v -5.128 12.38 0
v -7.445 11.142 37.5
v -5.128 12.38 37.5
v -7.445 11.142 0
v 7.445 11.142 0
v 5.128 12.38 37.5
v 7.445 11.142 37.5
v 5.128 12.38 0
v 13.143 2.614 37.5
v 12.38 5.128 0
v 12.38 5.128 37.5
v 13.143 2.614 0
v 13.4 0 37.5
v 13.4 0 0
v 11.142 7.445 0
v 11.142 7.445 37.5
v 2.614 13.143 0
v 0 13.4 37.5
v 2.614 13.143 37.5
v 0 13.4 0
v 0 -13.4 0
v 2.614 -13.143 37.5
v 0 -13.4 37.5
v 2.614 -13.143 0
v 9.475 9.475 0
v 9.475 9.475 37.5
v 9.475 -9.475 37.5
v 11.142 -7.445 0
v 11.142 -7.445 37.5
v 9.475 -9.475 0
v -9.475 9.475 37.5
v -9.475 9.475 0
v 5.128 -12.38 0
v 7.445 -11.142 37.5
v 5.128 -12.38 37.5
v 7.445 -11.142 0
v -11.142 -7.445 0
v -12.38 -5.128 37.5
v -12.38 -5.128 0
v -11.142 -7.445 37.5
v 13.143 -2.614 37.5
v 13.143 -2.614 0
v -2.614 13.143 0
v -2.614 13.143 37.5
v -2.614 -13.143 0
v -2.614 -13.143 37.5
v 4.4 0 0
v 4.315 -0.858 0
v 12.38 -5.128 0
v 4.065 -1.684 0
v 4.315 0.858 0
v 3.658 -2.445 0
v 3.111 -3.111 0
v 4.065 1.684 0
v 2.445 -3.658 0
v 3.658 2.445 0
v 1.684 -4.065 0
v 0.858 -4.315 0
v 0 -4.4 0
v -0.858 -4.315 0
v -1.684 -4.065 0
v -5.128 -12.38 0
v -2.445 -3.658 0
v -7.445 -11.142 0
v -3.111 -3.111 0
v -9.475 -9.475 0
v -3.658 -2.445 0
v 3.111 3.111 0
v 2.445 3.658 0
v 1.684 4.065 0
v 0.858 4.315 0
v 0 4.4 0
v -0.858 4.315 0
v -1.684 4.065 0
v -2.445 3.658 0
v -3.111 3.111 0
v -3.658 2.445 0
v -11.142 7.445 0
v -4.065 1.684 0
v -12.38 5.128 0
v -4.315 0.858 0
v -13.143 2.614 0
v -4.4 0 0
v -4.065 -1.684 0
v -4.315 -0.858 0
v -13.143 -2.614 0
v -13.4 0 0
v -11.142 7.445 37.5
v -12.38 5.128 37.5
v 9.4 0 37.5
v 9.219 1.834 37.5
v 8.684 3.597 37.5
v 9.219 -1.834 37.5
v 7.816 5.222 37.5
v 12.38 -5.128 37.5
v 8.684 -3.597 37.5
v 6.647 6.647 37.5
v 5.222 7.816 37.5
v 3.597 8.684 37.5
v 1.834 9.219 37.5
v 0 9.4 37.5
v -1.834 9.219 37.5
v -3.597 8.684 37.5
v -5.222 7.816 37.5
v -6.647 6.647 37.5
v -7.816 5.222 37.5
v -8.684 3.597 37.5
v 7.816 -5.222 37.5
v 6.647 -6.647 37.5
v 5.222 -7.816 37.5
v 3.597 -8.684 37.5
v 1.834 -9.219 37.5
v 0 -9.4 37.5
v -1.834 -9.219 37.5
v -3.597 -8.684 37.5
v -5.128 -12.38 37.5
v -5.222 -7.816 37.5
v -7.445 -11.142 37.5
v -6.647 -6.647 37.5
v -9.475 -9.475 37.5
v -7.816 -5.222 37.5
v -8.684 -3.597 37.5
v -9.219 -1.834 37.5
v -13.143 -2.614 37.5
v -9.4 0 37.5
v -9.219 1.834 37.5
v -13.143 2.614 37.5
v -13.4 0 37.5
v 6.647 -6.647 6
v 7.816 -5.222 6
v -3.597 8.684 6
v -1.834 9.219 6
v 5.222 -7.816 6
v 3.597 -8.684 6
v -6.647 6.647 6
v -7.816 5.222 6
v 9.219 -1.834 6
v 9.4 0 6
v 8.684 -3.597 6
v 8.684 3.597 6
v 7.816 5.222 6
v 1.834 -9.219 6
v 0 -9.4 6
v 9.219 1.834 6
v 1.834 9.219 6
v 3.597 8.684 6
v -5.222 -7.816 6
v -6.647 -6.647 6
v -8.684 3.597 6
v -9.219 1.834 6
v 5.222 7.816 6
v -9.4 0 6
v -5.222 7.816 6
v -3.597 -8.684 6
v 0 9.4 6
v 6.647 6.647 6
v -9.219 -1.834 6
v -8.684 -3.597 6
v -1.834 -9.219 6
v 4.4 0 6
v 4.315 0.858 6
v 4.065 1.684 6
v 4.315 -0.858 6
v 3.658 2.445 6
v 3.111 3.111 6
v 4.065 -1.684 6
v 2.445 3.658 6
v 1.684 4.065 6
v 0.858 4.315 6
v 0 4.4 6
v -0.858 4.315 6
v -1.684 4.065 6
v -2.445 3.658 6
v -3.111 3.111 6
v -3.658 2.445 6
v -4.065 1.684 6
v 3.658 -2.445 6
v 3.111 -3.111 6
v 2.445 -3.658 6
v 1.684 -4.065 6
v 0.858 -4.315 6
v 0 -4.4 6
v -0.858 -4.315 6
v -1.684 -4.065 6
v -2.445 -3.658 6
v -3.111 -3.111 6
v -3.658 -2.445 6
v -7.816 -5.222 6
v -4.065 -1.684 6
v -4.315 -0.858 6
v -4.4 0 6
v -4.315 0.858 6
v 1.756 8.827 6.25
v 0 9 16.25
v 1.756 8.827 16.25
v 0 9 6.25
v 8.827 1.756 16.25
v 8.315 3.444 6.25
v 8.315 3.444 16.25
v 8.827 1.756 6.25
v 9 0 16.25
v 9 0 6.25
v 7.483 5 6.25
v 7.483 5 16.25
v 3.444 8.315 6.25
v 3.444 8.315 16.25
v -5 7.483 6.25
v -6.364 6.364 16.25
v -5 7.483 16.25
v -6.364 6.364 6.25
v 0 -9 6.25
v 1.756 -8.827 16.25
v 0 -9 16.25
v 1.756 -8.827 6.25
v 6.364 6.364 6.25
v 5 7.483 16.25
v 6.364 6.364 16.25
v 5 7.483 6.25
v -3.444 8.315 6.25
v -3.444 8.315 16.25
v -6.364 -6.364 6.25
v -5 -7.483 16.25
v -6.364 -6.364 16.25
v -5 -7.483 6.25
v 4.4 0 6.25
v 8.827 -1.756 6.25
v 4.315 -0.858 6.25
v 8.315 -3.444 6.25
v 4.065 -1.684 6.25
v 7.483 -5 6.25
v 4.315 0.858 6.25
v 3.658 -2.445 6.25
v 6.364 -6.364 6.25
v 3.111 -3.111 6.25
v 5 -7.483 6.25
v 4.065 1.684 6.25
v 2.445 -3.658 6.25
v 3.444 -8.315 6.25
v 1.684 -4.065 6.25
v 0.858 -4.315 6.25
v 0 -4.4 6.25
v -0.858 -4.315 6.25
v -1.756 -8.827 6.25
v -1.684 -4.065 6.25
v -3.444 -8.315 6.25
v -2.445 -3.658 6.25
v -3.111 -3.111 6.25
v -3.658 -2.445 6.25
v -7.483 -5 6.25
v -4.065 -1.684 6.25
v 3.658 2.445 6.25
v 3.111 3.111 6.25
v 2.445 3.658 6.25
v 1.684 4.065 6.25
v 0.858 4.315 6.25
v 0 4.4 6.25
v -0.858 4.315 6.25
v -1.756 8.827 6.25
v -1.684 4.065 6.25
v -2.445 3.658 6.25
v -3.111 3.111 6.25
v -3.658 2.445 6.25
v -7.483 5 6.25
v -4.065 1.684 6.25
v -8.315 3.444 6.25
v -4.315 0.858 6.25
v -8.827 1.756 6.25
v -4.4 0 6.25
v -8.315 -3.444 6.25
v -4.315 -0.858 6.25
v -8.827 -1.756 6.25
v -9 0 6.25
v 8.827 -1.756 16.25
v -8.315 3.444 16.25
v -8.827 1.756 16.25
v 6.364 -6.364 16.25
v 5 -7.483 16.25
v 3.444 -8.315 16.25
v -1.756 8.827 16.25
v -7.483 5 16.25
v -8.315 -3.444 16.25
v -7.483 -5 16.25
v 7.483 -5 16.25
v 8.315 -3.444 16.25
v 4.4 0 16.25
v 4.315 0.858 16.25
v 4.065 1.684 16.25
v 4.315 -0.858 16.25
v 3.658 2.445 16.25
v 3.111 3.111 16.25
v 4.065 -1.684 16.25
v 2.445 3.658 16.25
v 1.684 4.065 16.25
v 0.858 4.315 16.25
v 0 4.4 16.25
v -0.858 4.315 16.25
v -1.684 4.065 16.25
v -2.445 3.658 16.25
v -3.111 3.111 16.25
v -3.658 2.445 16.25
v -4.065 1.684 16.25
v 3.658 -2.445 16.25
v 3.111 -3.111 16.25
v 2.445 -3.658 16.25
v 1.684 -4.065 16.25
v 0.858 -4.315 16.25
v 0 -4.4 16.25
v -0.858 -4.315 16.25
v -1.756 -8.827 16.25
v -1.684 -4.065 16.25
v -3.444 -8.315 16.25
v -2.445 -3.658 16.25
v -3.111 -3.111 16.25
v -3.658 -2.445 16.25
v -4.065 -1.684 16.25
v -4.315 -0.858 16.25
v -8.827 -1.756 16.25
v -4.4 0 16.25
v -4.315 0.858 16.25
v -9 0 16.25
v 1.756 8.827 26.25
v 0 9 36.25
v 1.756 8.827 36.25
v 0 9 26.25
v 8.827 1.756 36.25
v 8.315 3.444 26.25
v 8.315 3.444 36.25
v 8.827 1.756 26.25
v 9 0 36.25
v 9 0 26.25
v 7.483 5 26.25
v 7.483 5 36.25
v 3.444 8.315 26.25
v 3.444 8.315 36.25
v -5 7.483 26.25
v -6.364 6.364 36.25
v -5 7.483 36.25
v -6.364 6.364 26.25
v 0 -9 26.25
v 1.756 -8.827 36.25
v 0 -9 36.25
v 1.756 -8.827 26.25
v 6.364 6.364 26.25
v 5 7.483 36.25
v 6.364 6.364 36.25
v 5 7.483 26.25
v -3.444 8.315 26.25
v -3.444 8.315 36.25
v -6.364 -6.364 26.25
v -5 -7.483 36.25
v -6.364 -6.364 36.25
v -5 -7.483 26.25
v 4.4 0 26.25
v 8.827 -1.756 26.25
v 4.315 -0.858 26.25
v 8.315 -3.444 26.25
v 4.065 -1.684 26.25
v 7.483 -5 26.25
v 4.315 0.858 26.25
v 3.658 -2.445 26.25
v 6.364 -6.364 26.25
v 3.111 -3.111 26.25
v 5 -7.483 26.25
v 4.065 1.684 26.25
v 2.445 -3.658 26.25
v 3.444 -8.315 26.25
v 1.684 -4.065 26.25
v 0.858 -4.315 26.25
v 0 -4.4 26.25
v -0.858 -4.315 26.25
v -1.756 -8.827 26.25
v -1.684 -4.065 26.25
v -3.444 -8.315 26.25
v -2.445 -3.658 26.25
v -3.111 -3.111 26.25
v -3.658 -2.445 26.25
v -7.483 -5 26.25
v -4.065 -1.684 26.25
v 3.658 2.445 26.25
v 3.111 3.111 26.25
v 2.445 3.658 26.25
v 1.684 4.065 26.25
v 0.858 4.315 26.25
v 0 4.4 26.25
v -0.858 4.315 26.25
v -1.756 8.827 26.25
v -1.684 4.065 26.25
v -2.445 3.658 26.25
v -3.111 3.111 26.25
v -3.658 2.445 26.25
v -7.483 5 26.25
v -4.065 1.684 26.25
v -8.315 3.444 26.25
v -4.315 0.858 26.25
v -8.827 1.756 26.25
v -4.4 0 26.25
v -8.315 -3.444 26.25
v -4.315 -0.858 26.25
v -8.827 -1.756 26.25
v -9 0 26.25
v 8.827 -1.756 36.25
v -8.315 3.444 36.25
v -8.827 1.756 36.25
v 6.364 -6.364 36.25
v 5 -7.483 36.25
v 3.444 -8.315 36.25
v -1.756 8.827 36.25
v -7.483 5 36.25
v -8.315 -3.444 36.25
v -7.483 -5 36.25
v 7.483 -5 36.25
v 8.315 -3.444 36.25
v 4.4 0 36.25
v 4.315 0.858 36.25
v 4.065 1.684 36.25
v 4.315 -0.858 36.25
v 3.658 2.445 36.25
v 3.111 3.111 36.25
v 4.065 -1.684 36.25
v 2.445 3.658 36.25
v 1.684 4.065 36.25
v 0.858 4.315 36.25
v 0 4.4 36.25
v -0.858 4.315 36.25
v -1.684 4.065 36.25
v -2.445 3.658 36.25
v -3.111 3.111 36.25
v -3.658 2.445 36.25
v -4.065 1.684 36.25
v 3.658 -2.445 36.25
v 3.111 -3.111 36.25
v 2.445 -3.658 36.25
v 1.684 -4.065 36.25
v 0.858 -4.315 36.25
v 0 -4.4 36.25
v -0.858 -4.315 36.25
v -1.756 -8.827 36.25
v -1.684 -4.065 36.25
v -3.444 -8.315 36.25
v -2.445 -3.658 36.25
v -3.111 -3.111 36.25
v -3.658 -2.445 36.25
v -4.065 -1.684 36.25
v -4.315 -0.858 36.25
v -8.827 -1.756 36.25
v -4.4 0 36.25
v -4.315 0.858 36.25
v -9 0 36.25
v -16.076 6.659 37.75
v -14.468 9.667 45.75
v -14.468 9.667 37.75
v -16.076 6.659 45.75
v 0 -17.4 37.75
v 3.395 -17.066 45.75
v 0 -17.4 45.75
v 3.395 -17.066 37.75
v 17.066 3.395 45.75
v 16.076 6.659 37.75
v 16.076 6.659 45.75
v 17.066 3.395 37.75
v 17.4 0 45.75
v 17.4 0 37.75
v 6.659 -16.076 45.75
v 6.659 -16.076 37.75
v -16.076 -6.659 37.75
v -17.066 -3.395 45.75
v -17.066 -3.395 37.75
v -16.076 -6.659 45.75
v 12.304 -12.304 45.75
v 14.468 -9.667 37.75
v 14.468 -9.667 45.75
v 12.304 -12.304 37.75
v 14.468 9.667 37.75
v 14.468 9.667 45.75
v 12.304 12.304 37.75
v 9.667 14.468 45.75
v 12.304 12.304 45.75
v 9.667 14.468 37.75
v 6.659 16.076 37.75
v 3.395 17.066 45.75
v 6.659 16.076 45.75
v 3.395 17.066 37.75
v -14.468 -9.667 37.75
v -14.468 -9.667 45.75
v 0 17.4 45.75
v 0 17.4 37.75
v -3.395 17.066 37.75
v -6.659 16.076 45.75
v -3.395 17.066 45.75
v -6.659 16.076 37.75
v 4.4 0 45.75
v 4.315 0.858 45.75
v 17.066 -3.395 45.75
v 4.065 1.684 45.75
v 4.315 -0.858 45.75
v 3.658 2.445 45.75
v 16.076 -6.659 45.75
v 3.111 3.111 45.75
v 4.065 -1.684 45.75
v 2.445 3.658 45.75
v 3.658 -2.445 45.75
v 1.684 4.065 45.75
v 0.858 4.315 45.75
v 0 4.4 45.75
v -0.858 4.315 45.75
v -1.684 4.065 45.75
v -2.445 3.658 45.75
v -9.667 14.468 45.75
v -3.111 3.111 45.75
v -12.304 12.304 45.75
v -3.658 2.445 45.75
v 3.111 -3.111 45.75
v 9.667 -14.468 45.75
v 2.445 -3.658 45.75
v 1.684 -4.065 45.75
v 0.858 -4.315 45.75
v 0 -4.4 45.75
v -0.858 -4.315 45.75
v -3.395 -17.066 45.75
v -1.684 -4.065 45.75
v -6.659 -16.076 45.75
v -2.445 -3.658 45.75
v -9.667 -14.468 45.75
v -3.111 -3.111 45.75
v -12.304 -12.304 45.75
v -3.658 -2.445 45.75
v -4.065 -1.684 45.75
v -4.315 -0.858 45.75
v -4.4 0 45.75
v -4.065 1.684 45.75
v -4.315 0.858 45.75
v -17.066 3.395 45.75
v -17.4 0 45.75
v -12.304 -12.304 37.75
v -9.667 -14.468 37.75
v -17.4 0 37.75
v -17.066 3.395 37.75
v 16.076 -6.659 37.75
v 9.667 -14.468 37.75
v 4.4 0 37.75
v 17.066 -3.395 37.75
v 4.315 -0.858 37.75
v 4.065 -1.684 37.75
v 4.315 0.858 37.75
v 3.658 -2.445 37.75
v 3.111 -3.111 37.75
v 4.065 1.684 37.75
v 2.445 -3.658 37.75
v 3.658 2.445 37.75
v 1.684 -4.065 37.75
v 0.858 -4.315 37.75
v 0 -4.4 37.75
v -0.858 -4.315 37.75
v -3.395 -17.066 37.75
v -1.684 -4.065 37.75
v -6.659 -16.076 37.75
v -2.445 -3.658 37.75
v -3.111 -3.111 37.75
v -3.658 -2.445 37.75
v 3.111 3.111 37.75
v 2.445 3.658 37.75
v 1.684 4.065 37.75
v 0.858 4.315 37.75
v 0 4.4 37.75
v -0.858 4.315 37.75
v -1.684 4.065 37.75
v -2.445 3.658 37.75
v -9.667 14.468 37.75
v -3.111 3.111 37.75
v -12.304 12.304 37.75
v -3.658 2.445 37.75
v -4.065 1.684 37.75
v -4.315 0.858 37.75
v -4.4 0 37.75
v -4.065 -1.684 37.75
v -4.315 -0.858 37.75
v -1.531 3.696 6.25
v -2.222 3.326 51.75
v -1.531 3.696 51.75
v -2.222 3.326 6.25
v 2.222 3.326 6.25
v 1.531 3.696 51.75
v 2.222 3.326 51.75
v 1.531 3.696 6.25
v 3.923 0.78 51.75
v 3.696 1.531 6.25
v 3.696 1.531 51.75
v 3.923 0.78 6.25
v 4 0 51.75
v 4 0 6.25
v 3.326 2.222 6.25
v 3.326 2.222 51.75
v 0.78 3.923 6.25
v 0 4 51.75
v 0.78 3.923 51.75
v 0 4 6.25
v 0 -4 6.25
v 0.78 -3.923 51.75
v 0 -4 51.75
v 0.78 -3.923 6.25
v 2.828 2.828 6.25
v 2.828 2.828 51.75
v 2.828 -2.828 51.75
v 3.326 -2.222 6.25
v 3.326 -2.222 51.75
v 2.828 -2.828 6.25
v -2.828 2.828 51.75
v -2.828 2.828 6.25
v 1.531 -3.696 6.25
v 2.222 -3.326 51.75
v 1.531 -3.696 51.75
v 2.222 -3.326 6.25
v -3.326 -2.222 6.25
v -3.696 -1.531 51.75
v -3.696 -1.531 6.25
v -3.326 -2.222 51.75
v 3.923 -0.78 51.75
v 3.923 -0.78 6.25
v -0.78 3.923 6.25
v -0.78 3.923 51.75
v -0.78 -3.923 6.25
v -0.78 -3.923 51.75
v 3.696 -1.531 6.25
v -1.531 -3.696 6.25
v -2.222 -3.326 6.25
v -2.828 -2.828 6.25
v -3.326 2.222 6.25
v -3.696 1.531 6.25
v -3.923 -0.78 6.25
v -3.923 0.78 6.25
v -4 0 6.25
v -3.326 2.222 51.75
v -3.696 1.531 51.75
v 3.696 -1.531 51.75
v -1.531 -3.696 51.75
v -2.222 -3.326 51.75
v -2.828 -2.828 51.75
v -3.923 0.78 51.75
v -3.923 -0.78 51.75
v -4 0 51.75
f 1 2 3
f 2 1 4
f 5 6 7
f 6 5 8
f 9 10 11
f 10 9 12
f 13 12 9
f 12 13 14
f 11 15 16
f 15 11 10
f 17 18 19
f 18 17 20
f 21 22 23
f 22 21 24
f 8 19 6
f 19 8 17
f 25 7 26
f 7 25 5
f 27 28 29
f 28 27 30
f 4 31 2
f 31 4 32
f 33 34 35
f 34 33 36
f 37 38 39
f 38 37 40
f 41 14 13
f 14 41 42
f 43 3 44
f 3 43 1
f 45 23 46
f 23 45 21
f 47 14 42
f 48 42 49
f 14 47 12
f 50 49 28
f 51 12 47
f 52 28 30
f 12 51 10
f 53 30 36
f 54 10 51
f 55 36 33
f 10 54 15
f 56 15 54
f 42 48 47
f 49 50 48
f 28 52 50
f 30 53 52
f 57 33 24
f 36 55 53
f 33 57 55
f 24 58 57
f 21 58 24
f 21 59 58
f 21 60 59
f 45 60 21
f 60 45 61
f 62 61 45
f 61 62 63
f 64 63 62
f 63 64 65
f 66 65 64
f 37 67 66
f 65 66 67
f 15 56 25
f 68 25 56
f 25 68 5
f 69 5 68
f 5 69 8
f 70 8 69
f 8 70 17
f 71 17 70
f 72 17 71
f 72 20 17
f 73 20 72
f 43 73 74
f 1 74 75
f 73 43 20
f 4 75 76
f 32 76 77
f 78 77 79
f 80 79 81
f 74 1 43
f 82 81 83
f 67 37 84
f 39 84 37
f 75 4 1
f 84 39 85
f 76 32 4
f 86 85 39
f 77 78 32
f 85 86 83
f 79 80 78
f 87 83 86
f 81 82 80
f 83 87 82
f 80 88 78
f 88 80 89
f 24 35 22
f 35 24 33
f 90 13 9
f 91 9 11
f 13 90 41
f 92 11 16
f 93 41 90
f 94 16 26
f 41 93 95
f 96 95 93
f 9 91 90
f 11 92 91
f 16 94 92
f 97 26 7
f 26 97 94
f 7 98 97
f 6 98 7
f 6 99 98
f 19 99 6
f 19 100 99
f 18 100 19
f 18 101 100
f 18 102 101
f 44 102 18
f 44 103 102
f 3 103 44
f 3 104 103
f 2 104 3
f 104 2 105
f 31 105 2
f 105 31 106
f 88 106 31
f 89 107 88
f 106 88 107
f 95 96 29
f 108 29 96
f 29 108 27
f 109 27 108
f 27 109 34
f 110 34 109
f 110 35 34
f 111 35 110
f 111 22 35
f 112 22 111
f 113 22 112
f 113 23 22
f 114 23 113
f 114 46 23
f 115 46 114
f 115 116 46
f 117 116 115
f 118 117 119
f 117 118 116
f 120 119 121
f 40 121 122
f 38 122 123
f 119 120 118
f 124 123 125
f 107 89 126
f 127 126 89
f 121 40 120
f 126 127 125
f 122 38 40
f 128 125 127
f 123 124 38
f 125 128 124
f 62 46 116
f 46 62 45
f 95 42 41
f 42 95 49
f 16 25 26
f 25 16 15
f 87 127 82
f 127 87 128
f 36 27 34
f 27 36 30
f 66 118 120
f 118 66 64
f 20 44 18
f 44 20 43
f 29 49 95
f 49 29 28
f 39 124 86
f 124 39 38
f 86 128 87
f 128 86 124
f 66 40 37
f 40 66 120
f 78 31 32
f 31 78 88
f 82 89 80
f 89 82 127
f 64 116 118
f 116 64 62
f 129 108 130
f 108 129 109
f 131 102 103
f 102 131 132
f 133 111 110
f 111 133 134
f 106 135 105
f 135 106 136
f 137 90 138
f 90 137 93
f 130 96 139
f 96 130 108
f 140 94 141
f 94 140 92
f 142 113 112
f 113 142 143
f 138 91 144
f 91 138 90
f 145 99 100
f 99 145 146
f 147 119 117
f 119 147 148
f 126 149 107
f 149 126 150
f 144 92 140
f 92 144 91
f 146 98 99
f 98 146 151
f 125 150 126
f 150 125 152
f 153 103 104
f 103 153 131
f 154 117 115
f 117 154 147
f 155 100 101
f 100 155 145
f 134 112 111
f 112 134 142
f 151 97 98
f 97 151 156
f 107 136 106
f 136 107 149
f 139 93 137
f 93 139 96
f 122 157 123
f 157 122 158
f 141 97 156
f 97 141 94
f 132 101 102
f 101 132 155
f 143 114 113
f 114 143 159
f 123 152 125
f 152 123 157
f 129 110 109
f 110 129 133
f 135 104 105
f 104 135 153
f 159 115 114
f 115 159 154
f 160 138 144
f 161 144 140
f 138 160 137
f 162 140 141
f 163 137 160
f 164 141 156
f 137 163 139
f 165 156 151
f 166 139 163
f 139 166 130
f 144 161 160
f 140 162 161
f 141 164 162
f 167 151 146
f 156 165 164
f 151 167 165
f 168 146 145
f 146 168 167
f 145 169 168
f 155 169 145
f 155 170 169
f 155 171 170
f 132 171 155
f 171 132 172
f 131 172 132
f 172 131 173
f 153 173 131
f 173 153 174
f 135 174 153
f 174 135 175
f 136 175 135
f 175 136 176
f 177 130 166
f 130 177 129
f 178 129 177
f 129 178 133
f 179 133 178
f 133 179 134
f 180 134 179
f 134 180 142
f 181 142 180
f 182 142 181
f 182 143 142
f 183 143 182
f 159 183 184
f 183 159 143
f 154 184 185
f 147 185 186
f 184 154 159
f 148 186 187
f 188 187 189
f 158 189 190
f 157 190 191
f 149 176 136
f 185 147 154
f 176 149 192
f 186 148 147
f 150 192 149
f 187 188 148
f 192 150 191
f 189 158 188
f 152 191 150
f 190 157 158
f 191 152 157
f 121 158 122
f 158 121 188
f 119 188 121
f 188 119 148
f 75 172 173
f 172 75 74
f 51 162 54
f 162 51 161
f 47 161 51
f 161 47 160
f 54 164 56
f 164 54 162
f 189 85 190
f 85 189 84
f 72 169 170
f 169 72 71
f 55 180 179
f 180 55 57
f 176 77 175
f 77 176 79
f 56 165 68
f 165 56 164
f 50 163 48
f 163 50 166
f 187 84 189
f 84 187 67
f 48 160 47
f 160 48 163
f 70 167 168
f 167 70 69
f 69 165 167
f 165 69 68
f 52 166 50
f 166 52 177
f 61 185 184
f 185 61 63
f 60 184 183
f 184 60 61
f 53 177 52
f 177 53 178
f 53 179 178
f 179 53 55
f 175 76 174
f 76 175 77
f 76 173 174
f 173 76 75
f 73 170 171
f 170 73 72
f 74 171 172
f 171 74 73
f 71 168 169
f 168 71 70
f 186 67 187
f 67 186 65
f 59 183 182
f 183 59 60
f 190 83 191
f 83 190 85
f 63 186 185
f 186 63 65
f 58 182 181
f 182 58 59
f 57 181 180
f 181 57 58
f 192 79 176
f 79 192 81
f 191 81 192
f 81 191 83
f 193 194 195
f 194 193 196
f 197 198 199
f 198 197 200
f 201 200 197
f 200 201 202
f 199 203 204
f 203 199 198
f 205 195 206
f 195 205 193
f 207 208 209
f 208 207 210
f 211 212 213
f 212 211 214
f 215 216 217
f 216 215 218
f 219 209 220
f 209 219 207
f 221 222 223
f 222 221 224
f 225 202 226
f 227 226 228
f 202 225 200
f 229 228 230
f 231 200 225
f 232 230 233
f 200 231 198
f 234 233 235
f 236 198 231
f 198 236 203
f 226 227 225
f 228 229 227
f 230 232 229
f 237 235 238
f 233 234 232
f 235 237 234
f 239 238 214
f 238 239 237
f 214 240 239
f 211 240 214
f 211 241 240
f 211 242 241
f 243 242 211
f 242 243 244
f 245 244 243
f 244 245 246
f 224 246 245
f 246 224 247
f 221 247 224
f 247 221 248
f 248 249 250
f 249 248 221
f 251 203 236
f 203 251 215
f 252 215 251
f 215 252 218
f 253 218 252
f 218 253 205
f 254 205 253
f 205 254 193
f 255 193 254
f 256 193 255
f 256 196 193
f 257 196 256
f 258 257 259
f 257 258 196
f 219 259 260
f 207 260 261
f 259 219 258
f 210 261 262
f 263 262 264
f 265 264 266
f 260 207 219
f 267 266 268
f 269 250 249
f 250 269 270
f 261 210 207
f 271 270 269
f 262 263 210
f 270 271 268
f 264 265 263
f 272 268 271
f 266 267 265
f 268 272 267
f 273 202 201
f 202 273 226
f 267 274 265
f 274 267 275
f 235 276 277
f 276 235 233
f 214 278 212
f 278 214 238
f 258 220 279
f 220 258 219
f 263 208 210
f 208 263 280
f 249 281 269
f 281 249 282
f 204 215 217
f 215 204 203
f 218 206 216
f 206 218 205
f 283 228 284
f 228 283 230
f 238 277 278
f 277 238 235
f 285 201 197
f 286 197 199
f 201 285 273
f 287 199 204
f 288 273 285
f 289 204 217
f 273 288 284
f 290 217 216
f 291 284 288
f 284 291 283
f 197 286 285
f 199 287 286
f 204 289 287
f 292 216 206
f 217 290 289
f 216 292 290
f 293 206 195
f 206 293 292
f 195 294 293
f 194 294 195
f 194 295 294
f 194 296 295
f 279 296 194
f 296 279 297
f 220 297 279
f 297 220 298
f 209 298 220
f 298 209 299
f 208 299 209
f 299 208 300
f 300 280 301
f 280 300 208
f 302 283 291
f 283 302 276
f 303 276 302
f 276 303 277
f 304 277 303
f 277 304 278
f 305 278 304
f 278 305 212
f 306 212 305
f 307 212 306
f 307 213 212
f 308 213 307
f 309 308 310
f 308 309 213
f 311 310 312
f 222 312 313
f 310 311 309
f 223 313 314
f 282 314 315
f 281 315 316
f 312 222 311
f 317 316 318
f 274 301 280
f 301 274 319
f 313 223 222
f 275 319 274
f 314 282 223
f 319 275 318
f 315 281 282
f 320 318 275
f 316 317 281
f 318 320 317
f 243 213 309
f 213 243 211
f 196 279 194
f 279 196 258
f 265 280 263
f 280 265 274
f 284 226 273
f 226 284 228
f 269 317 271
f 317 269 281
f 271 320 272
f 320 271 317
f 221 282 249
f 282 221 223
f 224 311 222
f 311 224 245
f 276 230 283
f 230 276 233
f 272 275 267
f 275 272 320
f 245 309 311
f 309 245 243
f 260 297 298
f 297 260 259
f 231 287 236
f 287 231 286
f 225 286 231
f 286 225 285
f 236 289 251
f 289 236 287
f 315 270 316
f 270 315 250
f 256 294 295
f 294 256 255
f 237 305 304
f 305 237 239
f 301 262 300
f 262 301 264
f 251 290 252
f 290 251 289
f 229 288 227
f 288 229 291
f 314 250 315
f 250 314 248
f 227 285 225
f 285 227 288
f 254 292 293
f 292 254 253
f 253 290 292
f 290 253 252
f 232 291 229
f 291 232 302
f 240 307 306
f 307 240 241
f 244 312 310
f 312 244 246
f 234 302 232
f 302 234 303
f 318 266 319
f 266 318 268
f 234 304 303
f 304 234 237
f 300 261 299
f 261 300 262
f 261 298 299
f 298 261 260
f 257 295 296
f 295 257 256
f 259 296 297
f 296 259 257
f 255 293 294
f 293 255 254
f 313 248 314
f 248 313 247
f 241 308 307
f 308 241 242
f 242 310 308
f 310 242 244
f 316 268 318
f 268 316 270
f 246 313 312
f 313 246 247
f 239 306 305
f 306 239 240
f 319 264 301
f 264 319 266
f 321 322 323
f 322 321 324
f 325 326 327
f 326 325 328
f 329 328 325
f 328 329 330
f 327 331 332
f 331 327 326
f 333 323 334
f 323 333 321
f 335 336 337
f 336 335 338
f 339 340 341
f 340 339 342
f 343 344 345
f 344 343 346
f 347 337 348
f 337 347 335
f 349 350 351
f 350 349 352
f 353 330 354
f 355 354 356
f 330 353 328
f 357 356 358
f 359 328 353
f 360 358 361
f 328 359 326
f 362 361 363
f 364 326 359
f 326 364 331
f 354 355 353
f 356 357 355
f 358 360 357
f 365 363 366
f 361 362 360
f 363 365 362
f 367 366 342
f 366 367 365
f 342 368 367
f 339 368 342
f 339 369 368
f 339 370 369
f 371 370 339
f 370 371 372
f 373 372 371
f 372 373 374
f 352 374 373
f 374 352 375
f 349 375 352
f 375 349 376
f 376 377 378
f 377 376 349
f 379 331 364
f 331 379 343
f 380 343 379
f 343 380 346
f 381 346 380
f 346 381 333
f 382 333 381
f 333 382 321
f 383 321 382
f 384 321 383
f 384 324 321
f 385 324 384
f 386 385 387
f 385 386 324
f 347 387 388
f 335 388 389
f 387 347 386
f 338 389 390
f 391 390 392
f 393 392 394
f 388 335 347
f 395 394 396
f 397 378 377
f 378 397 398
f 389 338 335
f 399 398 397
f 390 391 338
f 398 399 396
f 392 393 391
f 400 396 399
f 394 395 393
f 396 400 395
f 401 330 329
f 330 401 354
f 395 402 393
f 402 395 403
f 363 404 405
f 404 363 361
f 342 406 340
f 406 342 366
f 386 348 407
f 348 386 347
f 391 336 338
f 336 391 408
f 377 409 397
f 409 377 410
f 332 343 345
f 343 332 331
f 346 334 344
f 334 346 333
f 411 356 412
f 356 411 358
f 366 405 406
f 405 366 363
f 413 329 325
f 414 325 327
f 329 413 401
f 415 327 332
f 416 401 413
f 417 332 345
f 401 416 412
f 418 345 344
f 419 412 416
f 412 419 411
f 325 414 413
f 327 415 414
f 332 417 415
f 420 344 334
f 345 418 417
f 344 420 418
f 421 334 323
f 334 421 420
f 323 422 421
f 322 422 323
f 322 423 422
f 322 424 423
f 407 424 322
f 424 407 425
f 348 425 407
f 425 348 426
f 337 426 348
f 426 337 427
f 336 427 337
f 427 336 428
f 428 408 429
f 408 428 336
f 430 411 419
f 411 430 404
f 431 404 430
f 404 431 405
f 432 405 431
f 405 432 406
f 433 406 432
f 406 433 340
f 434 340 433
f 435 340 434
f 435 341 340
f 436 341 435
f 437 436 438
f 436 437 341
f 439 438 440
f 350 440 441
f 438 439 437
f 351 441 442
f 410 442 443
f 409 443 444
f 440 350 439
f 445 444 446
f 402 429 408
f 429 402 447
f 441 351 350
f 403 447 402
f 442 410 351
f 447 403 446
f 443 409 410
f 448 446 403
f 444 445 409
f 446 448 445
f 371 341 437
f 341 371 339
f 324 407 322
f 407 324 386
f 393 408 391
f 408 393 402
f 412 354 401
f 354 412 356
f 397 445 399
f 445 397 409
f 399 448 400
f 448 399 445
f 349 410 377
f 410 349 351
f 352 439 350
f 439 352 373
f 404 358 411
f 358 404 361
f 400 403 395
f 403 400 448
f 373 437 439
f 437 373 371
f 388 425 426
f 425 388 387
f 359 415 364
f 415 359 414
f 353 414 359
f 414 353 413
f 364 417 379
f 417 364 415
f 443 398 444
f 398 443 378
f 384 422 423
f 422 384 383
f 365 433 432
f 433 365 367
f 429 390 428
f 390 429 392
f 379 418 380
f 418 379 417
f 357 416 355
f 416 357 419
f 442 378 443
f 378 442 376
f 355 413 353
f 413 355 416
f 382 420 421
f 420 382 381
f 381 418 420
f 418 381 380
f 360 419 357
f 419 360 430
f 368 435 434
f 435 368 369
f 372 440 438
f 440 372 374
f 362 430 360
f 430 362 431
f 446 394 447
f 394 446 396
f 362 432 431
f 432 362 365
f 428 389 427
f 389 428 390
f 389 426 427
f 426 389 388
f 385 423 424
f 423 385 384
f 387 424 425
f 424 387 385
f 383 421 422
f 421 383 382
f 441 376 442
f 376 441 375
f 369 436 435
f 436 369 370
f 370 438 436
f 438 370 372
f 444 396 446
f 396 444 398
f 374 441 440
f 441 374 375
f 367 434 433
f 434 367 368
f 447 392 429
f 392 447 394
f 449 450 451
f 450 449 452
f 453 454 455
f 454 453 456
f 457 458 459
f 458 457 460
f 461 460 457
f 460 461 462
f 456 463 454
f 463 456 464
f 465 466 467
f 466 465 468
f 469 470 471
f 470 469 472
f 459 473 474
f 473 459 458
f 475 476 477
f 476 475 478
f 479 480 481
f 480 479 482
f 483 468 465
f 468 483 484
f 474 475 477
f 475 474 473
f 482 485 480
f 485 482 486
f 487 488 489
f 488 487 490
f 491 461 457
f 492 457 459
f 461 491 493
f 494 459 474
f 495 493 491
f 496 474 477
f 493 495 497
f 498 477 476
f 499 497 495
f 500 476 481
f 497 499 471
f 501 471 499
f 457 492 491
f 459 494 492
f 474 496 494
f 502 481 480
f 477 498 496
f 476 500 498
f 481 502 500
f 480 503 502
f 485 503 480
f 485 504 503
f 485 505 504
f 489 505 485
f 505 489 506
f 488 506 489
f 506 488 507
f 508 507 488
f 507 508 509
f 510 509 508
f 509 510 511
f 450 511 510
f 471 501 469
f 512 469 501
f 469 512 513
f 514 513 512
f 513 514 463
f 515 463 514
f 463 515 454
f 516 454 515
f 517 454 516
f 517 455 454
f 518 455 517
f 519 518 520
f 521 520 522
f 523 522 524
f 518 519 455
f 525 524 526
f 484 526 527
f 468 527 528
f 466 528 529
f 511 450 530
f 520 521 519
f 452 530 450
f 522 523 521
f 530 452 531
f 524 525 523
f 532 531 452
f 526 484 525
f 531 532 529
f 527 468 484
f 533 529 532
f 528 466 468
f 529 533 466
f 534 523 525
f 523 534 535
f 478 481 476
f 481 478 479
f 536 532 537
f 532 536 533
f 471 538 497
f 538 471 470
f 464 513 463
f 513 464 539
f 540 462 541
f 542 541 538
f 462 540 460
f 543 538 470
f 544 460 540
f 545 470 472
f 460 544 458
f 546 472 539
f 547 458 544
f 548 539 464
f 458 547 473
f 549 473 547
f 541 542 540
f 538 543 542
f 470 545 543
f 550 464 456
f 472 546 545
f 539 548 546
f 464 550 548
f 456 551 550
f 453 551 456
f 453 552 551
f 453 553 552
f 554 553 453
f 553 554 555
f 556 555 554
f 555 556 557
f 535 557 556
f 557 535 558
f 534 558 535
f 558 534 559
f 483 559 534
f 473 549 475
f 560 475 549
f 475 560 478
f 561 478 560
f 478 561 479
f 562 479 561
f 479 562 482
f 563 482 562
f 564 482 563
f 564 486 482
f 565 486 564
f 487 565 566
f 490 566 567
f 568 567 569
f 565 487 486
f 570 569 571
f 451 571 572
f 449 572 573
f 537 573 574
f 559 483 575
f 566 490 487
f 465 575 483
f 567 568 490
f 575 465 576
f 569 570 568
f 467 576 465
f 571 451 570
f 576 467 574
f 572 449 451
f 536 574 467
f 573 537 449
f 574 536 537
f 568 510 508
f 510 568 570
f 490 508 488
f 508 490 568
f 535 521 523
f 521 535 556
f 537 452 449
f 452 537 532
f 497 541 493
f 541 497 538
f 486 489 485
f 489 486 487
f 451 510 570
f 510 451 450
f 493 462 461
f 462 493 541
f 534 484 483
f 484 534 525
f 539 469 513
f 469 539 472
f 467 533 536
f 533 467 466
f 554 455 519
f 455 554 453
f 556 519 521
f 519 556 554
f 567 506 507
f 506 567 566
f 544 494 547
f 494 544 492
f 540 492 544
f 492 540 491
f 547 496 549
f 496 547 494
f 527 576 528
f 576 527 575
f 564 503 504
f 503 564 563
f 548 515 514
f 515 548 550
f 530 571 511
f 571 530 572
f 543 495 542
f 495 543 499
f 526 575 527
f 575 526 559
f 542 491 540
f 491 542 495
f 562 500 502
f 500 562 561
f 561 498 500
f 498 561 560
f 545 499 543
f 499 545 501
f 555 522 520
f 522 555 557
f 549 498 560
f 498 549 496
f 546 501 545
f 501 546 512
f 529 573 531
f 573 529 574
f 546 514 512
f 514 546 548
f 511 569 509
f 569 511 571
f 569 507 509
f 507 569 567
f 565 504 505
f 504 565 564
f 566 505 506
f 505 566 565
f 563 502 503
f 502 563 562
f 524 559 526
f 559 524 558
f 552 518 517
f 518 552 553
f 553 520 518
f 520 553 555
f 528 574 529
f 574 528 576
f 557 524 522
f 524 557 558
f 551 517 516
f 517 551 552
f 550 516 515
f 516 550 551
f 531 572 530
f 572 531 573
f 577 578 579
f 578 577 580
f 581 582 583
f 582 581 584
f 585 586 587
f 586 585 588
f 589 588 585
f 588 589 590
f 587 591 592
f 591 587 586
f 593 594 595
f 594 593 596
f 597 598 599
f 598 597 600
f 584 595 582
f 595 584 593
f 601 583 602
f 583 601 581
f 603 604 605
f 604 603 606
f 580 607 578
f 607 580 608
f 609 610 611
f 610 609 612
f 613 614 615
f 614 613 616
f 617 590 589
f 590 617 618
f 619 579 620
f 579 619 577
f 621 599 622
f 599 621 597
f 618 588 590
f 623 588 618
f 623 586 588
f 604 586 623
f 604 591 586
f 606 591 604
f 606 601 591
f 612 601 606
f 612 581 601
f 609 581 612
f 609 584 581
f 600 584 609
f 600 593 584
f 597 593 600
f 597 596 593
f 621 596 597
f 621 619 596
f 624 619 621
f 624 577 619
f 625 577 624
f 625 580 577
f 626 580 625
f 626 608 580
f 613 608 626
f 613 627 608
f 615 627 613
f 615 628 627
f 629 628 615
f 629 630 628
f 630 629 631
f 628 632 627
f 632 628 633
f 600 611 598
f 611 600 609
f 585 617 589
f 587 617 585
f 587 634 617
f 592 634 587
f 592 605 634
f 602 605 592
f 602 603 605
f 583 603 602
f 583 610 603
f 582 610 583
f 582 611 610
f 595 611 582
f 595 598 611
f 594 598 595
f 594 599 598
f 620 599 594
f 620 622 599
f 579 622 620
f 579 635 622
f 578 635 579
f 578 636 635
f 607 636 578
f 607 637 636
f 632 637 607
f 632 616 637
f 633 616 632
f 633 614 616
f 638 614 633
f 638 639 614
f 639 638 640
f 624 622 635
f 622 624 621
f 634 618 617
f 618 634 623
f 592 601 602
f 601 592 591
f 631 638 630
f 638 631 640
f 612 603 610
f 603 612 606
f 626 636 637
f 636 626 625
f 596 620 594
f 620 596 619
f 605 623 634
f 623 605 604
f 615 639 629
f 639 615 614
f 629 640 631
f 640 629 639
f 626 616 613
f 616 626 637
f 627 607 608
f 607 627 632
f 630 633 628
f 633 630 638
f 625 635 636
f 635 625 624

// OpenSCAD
$fn = 32;

// ------------------------------------------------------------------------
// Shaft station: cup d26.8 x 37.5 mm, shaft d8
// Every part is its own module, assembly() places every instance.
// ------------------------------------------------------------------------

// --- part 1 ---
module housing_cup() {
  difference() {
    cylinder(h = 37.5, d = 26.8);
    translate([0, 0, 6]) cylinder(h = 32.5, d = 18.8);
    translate([0, 0, -1]) cylinder(h = 8, d = 8.8);
  }
}

// --- part 2 ---
module bearing_lower() {
  difference() {
      translate([0, 0, 0]) cylinder(h = 10, d = 18);
      translate([0, 0, -1]) cylinder(h = 12, d = 8.8);
    }
}

// --- part 3 ---
module bearing_upper() {
  difference() {
      translate([0, 0, 0]) cylinder(h = 10, d = 18);
      translate([0, 0, -1]) cylinder(h = 12, d = 8.8);
    }
}

// --- part 4 ---
module station_shaft() {
  translate([0, 0, -22.75]) cylinder(h = 45.5, d = 8);
}

// --- part 5 ---
module station_cover() {
  difference() {
    cylinder(h = 8, d = 34.8);
    translate([0, 0, -1]) cylinder(h = 10, d = 8.8);
  }
}

// --- assembly ---
module assembly() {
  color([0.80, 0.24, 0.20]) translate([0, 0, 0]) rotate([0, 0, 0]) housing_cup();
  color([0.20, 0.45, 0.75]) translate([0, 0, 6.25]) rotate([0, 0, 0]) bearing_lower();
  color([0.25, 0.62, 0.32]) translate([0, 0, 26.25]) rotate([0, 0, 0]) bearing_upper();
  color([0.92, 0.70, 0.18]) translate([0, 0, 29]) rotate([0, 0, 0]) station_shaft();
  color([0.58, 0.35, 0.70]) translate([0, 0, 37.75]) rotate([0, 0, 0]) station_cover();
}

assembly();
